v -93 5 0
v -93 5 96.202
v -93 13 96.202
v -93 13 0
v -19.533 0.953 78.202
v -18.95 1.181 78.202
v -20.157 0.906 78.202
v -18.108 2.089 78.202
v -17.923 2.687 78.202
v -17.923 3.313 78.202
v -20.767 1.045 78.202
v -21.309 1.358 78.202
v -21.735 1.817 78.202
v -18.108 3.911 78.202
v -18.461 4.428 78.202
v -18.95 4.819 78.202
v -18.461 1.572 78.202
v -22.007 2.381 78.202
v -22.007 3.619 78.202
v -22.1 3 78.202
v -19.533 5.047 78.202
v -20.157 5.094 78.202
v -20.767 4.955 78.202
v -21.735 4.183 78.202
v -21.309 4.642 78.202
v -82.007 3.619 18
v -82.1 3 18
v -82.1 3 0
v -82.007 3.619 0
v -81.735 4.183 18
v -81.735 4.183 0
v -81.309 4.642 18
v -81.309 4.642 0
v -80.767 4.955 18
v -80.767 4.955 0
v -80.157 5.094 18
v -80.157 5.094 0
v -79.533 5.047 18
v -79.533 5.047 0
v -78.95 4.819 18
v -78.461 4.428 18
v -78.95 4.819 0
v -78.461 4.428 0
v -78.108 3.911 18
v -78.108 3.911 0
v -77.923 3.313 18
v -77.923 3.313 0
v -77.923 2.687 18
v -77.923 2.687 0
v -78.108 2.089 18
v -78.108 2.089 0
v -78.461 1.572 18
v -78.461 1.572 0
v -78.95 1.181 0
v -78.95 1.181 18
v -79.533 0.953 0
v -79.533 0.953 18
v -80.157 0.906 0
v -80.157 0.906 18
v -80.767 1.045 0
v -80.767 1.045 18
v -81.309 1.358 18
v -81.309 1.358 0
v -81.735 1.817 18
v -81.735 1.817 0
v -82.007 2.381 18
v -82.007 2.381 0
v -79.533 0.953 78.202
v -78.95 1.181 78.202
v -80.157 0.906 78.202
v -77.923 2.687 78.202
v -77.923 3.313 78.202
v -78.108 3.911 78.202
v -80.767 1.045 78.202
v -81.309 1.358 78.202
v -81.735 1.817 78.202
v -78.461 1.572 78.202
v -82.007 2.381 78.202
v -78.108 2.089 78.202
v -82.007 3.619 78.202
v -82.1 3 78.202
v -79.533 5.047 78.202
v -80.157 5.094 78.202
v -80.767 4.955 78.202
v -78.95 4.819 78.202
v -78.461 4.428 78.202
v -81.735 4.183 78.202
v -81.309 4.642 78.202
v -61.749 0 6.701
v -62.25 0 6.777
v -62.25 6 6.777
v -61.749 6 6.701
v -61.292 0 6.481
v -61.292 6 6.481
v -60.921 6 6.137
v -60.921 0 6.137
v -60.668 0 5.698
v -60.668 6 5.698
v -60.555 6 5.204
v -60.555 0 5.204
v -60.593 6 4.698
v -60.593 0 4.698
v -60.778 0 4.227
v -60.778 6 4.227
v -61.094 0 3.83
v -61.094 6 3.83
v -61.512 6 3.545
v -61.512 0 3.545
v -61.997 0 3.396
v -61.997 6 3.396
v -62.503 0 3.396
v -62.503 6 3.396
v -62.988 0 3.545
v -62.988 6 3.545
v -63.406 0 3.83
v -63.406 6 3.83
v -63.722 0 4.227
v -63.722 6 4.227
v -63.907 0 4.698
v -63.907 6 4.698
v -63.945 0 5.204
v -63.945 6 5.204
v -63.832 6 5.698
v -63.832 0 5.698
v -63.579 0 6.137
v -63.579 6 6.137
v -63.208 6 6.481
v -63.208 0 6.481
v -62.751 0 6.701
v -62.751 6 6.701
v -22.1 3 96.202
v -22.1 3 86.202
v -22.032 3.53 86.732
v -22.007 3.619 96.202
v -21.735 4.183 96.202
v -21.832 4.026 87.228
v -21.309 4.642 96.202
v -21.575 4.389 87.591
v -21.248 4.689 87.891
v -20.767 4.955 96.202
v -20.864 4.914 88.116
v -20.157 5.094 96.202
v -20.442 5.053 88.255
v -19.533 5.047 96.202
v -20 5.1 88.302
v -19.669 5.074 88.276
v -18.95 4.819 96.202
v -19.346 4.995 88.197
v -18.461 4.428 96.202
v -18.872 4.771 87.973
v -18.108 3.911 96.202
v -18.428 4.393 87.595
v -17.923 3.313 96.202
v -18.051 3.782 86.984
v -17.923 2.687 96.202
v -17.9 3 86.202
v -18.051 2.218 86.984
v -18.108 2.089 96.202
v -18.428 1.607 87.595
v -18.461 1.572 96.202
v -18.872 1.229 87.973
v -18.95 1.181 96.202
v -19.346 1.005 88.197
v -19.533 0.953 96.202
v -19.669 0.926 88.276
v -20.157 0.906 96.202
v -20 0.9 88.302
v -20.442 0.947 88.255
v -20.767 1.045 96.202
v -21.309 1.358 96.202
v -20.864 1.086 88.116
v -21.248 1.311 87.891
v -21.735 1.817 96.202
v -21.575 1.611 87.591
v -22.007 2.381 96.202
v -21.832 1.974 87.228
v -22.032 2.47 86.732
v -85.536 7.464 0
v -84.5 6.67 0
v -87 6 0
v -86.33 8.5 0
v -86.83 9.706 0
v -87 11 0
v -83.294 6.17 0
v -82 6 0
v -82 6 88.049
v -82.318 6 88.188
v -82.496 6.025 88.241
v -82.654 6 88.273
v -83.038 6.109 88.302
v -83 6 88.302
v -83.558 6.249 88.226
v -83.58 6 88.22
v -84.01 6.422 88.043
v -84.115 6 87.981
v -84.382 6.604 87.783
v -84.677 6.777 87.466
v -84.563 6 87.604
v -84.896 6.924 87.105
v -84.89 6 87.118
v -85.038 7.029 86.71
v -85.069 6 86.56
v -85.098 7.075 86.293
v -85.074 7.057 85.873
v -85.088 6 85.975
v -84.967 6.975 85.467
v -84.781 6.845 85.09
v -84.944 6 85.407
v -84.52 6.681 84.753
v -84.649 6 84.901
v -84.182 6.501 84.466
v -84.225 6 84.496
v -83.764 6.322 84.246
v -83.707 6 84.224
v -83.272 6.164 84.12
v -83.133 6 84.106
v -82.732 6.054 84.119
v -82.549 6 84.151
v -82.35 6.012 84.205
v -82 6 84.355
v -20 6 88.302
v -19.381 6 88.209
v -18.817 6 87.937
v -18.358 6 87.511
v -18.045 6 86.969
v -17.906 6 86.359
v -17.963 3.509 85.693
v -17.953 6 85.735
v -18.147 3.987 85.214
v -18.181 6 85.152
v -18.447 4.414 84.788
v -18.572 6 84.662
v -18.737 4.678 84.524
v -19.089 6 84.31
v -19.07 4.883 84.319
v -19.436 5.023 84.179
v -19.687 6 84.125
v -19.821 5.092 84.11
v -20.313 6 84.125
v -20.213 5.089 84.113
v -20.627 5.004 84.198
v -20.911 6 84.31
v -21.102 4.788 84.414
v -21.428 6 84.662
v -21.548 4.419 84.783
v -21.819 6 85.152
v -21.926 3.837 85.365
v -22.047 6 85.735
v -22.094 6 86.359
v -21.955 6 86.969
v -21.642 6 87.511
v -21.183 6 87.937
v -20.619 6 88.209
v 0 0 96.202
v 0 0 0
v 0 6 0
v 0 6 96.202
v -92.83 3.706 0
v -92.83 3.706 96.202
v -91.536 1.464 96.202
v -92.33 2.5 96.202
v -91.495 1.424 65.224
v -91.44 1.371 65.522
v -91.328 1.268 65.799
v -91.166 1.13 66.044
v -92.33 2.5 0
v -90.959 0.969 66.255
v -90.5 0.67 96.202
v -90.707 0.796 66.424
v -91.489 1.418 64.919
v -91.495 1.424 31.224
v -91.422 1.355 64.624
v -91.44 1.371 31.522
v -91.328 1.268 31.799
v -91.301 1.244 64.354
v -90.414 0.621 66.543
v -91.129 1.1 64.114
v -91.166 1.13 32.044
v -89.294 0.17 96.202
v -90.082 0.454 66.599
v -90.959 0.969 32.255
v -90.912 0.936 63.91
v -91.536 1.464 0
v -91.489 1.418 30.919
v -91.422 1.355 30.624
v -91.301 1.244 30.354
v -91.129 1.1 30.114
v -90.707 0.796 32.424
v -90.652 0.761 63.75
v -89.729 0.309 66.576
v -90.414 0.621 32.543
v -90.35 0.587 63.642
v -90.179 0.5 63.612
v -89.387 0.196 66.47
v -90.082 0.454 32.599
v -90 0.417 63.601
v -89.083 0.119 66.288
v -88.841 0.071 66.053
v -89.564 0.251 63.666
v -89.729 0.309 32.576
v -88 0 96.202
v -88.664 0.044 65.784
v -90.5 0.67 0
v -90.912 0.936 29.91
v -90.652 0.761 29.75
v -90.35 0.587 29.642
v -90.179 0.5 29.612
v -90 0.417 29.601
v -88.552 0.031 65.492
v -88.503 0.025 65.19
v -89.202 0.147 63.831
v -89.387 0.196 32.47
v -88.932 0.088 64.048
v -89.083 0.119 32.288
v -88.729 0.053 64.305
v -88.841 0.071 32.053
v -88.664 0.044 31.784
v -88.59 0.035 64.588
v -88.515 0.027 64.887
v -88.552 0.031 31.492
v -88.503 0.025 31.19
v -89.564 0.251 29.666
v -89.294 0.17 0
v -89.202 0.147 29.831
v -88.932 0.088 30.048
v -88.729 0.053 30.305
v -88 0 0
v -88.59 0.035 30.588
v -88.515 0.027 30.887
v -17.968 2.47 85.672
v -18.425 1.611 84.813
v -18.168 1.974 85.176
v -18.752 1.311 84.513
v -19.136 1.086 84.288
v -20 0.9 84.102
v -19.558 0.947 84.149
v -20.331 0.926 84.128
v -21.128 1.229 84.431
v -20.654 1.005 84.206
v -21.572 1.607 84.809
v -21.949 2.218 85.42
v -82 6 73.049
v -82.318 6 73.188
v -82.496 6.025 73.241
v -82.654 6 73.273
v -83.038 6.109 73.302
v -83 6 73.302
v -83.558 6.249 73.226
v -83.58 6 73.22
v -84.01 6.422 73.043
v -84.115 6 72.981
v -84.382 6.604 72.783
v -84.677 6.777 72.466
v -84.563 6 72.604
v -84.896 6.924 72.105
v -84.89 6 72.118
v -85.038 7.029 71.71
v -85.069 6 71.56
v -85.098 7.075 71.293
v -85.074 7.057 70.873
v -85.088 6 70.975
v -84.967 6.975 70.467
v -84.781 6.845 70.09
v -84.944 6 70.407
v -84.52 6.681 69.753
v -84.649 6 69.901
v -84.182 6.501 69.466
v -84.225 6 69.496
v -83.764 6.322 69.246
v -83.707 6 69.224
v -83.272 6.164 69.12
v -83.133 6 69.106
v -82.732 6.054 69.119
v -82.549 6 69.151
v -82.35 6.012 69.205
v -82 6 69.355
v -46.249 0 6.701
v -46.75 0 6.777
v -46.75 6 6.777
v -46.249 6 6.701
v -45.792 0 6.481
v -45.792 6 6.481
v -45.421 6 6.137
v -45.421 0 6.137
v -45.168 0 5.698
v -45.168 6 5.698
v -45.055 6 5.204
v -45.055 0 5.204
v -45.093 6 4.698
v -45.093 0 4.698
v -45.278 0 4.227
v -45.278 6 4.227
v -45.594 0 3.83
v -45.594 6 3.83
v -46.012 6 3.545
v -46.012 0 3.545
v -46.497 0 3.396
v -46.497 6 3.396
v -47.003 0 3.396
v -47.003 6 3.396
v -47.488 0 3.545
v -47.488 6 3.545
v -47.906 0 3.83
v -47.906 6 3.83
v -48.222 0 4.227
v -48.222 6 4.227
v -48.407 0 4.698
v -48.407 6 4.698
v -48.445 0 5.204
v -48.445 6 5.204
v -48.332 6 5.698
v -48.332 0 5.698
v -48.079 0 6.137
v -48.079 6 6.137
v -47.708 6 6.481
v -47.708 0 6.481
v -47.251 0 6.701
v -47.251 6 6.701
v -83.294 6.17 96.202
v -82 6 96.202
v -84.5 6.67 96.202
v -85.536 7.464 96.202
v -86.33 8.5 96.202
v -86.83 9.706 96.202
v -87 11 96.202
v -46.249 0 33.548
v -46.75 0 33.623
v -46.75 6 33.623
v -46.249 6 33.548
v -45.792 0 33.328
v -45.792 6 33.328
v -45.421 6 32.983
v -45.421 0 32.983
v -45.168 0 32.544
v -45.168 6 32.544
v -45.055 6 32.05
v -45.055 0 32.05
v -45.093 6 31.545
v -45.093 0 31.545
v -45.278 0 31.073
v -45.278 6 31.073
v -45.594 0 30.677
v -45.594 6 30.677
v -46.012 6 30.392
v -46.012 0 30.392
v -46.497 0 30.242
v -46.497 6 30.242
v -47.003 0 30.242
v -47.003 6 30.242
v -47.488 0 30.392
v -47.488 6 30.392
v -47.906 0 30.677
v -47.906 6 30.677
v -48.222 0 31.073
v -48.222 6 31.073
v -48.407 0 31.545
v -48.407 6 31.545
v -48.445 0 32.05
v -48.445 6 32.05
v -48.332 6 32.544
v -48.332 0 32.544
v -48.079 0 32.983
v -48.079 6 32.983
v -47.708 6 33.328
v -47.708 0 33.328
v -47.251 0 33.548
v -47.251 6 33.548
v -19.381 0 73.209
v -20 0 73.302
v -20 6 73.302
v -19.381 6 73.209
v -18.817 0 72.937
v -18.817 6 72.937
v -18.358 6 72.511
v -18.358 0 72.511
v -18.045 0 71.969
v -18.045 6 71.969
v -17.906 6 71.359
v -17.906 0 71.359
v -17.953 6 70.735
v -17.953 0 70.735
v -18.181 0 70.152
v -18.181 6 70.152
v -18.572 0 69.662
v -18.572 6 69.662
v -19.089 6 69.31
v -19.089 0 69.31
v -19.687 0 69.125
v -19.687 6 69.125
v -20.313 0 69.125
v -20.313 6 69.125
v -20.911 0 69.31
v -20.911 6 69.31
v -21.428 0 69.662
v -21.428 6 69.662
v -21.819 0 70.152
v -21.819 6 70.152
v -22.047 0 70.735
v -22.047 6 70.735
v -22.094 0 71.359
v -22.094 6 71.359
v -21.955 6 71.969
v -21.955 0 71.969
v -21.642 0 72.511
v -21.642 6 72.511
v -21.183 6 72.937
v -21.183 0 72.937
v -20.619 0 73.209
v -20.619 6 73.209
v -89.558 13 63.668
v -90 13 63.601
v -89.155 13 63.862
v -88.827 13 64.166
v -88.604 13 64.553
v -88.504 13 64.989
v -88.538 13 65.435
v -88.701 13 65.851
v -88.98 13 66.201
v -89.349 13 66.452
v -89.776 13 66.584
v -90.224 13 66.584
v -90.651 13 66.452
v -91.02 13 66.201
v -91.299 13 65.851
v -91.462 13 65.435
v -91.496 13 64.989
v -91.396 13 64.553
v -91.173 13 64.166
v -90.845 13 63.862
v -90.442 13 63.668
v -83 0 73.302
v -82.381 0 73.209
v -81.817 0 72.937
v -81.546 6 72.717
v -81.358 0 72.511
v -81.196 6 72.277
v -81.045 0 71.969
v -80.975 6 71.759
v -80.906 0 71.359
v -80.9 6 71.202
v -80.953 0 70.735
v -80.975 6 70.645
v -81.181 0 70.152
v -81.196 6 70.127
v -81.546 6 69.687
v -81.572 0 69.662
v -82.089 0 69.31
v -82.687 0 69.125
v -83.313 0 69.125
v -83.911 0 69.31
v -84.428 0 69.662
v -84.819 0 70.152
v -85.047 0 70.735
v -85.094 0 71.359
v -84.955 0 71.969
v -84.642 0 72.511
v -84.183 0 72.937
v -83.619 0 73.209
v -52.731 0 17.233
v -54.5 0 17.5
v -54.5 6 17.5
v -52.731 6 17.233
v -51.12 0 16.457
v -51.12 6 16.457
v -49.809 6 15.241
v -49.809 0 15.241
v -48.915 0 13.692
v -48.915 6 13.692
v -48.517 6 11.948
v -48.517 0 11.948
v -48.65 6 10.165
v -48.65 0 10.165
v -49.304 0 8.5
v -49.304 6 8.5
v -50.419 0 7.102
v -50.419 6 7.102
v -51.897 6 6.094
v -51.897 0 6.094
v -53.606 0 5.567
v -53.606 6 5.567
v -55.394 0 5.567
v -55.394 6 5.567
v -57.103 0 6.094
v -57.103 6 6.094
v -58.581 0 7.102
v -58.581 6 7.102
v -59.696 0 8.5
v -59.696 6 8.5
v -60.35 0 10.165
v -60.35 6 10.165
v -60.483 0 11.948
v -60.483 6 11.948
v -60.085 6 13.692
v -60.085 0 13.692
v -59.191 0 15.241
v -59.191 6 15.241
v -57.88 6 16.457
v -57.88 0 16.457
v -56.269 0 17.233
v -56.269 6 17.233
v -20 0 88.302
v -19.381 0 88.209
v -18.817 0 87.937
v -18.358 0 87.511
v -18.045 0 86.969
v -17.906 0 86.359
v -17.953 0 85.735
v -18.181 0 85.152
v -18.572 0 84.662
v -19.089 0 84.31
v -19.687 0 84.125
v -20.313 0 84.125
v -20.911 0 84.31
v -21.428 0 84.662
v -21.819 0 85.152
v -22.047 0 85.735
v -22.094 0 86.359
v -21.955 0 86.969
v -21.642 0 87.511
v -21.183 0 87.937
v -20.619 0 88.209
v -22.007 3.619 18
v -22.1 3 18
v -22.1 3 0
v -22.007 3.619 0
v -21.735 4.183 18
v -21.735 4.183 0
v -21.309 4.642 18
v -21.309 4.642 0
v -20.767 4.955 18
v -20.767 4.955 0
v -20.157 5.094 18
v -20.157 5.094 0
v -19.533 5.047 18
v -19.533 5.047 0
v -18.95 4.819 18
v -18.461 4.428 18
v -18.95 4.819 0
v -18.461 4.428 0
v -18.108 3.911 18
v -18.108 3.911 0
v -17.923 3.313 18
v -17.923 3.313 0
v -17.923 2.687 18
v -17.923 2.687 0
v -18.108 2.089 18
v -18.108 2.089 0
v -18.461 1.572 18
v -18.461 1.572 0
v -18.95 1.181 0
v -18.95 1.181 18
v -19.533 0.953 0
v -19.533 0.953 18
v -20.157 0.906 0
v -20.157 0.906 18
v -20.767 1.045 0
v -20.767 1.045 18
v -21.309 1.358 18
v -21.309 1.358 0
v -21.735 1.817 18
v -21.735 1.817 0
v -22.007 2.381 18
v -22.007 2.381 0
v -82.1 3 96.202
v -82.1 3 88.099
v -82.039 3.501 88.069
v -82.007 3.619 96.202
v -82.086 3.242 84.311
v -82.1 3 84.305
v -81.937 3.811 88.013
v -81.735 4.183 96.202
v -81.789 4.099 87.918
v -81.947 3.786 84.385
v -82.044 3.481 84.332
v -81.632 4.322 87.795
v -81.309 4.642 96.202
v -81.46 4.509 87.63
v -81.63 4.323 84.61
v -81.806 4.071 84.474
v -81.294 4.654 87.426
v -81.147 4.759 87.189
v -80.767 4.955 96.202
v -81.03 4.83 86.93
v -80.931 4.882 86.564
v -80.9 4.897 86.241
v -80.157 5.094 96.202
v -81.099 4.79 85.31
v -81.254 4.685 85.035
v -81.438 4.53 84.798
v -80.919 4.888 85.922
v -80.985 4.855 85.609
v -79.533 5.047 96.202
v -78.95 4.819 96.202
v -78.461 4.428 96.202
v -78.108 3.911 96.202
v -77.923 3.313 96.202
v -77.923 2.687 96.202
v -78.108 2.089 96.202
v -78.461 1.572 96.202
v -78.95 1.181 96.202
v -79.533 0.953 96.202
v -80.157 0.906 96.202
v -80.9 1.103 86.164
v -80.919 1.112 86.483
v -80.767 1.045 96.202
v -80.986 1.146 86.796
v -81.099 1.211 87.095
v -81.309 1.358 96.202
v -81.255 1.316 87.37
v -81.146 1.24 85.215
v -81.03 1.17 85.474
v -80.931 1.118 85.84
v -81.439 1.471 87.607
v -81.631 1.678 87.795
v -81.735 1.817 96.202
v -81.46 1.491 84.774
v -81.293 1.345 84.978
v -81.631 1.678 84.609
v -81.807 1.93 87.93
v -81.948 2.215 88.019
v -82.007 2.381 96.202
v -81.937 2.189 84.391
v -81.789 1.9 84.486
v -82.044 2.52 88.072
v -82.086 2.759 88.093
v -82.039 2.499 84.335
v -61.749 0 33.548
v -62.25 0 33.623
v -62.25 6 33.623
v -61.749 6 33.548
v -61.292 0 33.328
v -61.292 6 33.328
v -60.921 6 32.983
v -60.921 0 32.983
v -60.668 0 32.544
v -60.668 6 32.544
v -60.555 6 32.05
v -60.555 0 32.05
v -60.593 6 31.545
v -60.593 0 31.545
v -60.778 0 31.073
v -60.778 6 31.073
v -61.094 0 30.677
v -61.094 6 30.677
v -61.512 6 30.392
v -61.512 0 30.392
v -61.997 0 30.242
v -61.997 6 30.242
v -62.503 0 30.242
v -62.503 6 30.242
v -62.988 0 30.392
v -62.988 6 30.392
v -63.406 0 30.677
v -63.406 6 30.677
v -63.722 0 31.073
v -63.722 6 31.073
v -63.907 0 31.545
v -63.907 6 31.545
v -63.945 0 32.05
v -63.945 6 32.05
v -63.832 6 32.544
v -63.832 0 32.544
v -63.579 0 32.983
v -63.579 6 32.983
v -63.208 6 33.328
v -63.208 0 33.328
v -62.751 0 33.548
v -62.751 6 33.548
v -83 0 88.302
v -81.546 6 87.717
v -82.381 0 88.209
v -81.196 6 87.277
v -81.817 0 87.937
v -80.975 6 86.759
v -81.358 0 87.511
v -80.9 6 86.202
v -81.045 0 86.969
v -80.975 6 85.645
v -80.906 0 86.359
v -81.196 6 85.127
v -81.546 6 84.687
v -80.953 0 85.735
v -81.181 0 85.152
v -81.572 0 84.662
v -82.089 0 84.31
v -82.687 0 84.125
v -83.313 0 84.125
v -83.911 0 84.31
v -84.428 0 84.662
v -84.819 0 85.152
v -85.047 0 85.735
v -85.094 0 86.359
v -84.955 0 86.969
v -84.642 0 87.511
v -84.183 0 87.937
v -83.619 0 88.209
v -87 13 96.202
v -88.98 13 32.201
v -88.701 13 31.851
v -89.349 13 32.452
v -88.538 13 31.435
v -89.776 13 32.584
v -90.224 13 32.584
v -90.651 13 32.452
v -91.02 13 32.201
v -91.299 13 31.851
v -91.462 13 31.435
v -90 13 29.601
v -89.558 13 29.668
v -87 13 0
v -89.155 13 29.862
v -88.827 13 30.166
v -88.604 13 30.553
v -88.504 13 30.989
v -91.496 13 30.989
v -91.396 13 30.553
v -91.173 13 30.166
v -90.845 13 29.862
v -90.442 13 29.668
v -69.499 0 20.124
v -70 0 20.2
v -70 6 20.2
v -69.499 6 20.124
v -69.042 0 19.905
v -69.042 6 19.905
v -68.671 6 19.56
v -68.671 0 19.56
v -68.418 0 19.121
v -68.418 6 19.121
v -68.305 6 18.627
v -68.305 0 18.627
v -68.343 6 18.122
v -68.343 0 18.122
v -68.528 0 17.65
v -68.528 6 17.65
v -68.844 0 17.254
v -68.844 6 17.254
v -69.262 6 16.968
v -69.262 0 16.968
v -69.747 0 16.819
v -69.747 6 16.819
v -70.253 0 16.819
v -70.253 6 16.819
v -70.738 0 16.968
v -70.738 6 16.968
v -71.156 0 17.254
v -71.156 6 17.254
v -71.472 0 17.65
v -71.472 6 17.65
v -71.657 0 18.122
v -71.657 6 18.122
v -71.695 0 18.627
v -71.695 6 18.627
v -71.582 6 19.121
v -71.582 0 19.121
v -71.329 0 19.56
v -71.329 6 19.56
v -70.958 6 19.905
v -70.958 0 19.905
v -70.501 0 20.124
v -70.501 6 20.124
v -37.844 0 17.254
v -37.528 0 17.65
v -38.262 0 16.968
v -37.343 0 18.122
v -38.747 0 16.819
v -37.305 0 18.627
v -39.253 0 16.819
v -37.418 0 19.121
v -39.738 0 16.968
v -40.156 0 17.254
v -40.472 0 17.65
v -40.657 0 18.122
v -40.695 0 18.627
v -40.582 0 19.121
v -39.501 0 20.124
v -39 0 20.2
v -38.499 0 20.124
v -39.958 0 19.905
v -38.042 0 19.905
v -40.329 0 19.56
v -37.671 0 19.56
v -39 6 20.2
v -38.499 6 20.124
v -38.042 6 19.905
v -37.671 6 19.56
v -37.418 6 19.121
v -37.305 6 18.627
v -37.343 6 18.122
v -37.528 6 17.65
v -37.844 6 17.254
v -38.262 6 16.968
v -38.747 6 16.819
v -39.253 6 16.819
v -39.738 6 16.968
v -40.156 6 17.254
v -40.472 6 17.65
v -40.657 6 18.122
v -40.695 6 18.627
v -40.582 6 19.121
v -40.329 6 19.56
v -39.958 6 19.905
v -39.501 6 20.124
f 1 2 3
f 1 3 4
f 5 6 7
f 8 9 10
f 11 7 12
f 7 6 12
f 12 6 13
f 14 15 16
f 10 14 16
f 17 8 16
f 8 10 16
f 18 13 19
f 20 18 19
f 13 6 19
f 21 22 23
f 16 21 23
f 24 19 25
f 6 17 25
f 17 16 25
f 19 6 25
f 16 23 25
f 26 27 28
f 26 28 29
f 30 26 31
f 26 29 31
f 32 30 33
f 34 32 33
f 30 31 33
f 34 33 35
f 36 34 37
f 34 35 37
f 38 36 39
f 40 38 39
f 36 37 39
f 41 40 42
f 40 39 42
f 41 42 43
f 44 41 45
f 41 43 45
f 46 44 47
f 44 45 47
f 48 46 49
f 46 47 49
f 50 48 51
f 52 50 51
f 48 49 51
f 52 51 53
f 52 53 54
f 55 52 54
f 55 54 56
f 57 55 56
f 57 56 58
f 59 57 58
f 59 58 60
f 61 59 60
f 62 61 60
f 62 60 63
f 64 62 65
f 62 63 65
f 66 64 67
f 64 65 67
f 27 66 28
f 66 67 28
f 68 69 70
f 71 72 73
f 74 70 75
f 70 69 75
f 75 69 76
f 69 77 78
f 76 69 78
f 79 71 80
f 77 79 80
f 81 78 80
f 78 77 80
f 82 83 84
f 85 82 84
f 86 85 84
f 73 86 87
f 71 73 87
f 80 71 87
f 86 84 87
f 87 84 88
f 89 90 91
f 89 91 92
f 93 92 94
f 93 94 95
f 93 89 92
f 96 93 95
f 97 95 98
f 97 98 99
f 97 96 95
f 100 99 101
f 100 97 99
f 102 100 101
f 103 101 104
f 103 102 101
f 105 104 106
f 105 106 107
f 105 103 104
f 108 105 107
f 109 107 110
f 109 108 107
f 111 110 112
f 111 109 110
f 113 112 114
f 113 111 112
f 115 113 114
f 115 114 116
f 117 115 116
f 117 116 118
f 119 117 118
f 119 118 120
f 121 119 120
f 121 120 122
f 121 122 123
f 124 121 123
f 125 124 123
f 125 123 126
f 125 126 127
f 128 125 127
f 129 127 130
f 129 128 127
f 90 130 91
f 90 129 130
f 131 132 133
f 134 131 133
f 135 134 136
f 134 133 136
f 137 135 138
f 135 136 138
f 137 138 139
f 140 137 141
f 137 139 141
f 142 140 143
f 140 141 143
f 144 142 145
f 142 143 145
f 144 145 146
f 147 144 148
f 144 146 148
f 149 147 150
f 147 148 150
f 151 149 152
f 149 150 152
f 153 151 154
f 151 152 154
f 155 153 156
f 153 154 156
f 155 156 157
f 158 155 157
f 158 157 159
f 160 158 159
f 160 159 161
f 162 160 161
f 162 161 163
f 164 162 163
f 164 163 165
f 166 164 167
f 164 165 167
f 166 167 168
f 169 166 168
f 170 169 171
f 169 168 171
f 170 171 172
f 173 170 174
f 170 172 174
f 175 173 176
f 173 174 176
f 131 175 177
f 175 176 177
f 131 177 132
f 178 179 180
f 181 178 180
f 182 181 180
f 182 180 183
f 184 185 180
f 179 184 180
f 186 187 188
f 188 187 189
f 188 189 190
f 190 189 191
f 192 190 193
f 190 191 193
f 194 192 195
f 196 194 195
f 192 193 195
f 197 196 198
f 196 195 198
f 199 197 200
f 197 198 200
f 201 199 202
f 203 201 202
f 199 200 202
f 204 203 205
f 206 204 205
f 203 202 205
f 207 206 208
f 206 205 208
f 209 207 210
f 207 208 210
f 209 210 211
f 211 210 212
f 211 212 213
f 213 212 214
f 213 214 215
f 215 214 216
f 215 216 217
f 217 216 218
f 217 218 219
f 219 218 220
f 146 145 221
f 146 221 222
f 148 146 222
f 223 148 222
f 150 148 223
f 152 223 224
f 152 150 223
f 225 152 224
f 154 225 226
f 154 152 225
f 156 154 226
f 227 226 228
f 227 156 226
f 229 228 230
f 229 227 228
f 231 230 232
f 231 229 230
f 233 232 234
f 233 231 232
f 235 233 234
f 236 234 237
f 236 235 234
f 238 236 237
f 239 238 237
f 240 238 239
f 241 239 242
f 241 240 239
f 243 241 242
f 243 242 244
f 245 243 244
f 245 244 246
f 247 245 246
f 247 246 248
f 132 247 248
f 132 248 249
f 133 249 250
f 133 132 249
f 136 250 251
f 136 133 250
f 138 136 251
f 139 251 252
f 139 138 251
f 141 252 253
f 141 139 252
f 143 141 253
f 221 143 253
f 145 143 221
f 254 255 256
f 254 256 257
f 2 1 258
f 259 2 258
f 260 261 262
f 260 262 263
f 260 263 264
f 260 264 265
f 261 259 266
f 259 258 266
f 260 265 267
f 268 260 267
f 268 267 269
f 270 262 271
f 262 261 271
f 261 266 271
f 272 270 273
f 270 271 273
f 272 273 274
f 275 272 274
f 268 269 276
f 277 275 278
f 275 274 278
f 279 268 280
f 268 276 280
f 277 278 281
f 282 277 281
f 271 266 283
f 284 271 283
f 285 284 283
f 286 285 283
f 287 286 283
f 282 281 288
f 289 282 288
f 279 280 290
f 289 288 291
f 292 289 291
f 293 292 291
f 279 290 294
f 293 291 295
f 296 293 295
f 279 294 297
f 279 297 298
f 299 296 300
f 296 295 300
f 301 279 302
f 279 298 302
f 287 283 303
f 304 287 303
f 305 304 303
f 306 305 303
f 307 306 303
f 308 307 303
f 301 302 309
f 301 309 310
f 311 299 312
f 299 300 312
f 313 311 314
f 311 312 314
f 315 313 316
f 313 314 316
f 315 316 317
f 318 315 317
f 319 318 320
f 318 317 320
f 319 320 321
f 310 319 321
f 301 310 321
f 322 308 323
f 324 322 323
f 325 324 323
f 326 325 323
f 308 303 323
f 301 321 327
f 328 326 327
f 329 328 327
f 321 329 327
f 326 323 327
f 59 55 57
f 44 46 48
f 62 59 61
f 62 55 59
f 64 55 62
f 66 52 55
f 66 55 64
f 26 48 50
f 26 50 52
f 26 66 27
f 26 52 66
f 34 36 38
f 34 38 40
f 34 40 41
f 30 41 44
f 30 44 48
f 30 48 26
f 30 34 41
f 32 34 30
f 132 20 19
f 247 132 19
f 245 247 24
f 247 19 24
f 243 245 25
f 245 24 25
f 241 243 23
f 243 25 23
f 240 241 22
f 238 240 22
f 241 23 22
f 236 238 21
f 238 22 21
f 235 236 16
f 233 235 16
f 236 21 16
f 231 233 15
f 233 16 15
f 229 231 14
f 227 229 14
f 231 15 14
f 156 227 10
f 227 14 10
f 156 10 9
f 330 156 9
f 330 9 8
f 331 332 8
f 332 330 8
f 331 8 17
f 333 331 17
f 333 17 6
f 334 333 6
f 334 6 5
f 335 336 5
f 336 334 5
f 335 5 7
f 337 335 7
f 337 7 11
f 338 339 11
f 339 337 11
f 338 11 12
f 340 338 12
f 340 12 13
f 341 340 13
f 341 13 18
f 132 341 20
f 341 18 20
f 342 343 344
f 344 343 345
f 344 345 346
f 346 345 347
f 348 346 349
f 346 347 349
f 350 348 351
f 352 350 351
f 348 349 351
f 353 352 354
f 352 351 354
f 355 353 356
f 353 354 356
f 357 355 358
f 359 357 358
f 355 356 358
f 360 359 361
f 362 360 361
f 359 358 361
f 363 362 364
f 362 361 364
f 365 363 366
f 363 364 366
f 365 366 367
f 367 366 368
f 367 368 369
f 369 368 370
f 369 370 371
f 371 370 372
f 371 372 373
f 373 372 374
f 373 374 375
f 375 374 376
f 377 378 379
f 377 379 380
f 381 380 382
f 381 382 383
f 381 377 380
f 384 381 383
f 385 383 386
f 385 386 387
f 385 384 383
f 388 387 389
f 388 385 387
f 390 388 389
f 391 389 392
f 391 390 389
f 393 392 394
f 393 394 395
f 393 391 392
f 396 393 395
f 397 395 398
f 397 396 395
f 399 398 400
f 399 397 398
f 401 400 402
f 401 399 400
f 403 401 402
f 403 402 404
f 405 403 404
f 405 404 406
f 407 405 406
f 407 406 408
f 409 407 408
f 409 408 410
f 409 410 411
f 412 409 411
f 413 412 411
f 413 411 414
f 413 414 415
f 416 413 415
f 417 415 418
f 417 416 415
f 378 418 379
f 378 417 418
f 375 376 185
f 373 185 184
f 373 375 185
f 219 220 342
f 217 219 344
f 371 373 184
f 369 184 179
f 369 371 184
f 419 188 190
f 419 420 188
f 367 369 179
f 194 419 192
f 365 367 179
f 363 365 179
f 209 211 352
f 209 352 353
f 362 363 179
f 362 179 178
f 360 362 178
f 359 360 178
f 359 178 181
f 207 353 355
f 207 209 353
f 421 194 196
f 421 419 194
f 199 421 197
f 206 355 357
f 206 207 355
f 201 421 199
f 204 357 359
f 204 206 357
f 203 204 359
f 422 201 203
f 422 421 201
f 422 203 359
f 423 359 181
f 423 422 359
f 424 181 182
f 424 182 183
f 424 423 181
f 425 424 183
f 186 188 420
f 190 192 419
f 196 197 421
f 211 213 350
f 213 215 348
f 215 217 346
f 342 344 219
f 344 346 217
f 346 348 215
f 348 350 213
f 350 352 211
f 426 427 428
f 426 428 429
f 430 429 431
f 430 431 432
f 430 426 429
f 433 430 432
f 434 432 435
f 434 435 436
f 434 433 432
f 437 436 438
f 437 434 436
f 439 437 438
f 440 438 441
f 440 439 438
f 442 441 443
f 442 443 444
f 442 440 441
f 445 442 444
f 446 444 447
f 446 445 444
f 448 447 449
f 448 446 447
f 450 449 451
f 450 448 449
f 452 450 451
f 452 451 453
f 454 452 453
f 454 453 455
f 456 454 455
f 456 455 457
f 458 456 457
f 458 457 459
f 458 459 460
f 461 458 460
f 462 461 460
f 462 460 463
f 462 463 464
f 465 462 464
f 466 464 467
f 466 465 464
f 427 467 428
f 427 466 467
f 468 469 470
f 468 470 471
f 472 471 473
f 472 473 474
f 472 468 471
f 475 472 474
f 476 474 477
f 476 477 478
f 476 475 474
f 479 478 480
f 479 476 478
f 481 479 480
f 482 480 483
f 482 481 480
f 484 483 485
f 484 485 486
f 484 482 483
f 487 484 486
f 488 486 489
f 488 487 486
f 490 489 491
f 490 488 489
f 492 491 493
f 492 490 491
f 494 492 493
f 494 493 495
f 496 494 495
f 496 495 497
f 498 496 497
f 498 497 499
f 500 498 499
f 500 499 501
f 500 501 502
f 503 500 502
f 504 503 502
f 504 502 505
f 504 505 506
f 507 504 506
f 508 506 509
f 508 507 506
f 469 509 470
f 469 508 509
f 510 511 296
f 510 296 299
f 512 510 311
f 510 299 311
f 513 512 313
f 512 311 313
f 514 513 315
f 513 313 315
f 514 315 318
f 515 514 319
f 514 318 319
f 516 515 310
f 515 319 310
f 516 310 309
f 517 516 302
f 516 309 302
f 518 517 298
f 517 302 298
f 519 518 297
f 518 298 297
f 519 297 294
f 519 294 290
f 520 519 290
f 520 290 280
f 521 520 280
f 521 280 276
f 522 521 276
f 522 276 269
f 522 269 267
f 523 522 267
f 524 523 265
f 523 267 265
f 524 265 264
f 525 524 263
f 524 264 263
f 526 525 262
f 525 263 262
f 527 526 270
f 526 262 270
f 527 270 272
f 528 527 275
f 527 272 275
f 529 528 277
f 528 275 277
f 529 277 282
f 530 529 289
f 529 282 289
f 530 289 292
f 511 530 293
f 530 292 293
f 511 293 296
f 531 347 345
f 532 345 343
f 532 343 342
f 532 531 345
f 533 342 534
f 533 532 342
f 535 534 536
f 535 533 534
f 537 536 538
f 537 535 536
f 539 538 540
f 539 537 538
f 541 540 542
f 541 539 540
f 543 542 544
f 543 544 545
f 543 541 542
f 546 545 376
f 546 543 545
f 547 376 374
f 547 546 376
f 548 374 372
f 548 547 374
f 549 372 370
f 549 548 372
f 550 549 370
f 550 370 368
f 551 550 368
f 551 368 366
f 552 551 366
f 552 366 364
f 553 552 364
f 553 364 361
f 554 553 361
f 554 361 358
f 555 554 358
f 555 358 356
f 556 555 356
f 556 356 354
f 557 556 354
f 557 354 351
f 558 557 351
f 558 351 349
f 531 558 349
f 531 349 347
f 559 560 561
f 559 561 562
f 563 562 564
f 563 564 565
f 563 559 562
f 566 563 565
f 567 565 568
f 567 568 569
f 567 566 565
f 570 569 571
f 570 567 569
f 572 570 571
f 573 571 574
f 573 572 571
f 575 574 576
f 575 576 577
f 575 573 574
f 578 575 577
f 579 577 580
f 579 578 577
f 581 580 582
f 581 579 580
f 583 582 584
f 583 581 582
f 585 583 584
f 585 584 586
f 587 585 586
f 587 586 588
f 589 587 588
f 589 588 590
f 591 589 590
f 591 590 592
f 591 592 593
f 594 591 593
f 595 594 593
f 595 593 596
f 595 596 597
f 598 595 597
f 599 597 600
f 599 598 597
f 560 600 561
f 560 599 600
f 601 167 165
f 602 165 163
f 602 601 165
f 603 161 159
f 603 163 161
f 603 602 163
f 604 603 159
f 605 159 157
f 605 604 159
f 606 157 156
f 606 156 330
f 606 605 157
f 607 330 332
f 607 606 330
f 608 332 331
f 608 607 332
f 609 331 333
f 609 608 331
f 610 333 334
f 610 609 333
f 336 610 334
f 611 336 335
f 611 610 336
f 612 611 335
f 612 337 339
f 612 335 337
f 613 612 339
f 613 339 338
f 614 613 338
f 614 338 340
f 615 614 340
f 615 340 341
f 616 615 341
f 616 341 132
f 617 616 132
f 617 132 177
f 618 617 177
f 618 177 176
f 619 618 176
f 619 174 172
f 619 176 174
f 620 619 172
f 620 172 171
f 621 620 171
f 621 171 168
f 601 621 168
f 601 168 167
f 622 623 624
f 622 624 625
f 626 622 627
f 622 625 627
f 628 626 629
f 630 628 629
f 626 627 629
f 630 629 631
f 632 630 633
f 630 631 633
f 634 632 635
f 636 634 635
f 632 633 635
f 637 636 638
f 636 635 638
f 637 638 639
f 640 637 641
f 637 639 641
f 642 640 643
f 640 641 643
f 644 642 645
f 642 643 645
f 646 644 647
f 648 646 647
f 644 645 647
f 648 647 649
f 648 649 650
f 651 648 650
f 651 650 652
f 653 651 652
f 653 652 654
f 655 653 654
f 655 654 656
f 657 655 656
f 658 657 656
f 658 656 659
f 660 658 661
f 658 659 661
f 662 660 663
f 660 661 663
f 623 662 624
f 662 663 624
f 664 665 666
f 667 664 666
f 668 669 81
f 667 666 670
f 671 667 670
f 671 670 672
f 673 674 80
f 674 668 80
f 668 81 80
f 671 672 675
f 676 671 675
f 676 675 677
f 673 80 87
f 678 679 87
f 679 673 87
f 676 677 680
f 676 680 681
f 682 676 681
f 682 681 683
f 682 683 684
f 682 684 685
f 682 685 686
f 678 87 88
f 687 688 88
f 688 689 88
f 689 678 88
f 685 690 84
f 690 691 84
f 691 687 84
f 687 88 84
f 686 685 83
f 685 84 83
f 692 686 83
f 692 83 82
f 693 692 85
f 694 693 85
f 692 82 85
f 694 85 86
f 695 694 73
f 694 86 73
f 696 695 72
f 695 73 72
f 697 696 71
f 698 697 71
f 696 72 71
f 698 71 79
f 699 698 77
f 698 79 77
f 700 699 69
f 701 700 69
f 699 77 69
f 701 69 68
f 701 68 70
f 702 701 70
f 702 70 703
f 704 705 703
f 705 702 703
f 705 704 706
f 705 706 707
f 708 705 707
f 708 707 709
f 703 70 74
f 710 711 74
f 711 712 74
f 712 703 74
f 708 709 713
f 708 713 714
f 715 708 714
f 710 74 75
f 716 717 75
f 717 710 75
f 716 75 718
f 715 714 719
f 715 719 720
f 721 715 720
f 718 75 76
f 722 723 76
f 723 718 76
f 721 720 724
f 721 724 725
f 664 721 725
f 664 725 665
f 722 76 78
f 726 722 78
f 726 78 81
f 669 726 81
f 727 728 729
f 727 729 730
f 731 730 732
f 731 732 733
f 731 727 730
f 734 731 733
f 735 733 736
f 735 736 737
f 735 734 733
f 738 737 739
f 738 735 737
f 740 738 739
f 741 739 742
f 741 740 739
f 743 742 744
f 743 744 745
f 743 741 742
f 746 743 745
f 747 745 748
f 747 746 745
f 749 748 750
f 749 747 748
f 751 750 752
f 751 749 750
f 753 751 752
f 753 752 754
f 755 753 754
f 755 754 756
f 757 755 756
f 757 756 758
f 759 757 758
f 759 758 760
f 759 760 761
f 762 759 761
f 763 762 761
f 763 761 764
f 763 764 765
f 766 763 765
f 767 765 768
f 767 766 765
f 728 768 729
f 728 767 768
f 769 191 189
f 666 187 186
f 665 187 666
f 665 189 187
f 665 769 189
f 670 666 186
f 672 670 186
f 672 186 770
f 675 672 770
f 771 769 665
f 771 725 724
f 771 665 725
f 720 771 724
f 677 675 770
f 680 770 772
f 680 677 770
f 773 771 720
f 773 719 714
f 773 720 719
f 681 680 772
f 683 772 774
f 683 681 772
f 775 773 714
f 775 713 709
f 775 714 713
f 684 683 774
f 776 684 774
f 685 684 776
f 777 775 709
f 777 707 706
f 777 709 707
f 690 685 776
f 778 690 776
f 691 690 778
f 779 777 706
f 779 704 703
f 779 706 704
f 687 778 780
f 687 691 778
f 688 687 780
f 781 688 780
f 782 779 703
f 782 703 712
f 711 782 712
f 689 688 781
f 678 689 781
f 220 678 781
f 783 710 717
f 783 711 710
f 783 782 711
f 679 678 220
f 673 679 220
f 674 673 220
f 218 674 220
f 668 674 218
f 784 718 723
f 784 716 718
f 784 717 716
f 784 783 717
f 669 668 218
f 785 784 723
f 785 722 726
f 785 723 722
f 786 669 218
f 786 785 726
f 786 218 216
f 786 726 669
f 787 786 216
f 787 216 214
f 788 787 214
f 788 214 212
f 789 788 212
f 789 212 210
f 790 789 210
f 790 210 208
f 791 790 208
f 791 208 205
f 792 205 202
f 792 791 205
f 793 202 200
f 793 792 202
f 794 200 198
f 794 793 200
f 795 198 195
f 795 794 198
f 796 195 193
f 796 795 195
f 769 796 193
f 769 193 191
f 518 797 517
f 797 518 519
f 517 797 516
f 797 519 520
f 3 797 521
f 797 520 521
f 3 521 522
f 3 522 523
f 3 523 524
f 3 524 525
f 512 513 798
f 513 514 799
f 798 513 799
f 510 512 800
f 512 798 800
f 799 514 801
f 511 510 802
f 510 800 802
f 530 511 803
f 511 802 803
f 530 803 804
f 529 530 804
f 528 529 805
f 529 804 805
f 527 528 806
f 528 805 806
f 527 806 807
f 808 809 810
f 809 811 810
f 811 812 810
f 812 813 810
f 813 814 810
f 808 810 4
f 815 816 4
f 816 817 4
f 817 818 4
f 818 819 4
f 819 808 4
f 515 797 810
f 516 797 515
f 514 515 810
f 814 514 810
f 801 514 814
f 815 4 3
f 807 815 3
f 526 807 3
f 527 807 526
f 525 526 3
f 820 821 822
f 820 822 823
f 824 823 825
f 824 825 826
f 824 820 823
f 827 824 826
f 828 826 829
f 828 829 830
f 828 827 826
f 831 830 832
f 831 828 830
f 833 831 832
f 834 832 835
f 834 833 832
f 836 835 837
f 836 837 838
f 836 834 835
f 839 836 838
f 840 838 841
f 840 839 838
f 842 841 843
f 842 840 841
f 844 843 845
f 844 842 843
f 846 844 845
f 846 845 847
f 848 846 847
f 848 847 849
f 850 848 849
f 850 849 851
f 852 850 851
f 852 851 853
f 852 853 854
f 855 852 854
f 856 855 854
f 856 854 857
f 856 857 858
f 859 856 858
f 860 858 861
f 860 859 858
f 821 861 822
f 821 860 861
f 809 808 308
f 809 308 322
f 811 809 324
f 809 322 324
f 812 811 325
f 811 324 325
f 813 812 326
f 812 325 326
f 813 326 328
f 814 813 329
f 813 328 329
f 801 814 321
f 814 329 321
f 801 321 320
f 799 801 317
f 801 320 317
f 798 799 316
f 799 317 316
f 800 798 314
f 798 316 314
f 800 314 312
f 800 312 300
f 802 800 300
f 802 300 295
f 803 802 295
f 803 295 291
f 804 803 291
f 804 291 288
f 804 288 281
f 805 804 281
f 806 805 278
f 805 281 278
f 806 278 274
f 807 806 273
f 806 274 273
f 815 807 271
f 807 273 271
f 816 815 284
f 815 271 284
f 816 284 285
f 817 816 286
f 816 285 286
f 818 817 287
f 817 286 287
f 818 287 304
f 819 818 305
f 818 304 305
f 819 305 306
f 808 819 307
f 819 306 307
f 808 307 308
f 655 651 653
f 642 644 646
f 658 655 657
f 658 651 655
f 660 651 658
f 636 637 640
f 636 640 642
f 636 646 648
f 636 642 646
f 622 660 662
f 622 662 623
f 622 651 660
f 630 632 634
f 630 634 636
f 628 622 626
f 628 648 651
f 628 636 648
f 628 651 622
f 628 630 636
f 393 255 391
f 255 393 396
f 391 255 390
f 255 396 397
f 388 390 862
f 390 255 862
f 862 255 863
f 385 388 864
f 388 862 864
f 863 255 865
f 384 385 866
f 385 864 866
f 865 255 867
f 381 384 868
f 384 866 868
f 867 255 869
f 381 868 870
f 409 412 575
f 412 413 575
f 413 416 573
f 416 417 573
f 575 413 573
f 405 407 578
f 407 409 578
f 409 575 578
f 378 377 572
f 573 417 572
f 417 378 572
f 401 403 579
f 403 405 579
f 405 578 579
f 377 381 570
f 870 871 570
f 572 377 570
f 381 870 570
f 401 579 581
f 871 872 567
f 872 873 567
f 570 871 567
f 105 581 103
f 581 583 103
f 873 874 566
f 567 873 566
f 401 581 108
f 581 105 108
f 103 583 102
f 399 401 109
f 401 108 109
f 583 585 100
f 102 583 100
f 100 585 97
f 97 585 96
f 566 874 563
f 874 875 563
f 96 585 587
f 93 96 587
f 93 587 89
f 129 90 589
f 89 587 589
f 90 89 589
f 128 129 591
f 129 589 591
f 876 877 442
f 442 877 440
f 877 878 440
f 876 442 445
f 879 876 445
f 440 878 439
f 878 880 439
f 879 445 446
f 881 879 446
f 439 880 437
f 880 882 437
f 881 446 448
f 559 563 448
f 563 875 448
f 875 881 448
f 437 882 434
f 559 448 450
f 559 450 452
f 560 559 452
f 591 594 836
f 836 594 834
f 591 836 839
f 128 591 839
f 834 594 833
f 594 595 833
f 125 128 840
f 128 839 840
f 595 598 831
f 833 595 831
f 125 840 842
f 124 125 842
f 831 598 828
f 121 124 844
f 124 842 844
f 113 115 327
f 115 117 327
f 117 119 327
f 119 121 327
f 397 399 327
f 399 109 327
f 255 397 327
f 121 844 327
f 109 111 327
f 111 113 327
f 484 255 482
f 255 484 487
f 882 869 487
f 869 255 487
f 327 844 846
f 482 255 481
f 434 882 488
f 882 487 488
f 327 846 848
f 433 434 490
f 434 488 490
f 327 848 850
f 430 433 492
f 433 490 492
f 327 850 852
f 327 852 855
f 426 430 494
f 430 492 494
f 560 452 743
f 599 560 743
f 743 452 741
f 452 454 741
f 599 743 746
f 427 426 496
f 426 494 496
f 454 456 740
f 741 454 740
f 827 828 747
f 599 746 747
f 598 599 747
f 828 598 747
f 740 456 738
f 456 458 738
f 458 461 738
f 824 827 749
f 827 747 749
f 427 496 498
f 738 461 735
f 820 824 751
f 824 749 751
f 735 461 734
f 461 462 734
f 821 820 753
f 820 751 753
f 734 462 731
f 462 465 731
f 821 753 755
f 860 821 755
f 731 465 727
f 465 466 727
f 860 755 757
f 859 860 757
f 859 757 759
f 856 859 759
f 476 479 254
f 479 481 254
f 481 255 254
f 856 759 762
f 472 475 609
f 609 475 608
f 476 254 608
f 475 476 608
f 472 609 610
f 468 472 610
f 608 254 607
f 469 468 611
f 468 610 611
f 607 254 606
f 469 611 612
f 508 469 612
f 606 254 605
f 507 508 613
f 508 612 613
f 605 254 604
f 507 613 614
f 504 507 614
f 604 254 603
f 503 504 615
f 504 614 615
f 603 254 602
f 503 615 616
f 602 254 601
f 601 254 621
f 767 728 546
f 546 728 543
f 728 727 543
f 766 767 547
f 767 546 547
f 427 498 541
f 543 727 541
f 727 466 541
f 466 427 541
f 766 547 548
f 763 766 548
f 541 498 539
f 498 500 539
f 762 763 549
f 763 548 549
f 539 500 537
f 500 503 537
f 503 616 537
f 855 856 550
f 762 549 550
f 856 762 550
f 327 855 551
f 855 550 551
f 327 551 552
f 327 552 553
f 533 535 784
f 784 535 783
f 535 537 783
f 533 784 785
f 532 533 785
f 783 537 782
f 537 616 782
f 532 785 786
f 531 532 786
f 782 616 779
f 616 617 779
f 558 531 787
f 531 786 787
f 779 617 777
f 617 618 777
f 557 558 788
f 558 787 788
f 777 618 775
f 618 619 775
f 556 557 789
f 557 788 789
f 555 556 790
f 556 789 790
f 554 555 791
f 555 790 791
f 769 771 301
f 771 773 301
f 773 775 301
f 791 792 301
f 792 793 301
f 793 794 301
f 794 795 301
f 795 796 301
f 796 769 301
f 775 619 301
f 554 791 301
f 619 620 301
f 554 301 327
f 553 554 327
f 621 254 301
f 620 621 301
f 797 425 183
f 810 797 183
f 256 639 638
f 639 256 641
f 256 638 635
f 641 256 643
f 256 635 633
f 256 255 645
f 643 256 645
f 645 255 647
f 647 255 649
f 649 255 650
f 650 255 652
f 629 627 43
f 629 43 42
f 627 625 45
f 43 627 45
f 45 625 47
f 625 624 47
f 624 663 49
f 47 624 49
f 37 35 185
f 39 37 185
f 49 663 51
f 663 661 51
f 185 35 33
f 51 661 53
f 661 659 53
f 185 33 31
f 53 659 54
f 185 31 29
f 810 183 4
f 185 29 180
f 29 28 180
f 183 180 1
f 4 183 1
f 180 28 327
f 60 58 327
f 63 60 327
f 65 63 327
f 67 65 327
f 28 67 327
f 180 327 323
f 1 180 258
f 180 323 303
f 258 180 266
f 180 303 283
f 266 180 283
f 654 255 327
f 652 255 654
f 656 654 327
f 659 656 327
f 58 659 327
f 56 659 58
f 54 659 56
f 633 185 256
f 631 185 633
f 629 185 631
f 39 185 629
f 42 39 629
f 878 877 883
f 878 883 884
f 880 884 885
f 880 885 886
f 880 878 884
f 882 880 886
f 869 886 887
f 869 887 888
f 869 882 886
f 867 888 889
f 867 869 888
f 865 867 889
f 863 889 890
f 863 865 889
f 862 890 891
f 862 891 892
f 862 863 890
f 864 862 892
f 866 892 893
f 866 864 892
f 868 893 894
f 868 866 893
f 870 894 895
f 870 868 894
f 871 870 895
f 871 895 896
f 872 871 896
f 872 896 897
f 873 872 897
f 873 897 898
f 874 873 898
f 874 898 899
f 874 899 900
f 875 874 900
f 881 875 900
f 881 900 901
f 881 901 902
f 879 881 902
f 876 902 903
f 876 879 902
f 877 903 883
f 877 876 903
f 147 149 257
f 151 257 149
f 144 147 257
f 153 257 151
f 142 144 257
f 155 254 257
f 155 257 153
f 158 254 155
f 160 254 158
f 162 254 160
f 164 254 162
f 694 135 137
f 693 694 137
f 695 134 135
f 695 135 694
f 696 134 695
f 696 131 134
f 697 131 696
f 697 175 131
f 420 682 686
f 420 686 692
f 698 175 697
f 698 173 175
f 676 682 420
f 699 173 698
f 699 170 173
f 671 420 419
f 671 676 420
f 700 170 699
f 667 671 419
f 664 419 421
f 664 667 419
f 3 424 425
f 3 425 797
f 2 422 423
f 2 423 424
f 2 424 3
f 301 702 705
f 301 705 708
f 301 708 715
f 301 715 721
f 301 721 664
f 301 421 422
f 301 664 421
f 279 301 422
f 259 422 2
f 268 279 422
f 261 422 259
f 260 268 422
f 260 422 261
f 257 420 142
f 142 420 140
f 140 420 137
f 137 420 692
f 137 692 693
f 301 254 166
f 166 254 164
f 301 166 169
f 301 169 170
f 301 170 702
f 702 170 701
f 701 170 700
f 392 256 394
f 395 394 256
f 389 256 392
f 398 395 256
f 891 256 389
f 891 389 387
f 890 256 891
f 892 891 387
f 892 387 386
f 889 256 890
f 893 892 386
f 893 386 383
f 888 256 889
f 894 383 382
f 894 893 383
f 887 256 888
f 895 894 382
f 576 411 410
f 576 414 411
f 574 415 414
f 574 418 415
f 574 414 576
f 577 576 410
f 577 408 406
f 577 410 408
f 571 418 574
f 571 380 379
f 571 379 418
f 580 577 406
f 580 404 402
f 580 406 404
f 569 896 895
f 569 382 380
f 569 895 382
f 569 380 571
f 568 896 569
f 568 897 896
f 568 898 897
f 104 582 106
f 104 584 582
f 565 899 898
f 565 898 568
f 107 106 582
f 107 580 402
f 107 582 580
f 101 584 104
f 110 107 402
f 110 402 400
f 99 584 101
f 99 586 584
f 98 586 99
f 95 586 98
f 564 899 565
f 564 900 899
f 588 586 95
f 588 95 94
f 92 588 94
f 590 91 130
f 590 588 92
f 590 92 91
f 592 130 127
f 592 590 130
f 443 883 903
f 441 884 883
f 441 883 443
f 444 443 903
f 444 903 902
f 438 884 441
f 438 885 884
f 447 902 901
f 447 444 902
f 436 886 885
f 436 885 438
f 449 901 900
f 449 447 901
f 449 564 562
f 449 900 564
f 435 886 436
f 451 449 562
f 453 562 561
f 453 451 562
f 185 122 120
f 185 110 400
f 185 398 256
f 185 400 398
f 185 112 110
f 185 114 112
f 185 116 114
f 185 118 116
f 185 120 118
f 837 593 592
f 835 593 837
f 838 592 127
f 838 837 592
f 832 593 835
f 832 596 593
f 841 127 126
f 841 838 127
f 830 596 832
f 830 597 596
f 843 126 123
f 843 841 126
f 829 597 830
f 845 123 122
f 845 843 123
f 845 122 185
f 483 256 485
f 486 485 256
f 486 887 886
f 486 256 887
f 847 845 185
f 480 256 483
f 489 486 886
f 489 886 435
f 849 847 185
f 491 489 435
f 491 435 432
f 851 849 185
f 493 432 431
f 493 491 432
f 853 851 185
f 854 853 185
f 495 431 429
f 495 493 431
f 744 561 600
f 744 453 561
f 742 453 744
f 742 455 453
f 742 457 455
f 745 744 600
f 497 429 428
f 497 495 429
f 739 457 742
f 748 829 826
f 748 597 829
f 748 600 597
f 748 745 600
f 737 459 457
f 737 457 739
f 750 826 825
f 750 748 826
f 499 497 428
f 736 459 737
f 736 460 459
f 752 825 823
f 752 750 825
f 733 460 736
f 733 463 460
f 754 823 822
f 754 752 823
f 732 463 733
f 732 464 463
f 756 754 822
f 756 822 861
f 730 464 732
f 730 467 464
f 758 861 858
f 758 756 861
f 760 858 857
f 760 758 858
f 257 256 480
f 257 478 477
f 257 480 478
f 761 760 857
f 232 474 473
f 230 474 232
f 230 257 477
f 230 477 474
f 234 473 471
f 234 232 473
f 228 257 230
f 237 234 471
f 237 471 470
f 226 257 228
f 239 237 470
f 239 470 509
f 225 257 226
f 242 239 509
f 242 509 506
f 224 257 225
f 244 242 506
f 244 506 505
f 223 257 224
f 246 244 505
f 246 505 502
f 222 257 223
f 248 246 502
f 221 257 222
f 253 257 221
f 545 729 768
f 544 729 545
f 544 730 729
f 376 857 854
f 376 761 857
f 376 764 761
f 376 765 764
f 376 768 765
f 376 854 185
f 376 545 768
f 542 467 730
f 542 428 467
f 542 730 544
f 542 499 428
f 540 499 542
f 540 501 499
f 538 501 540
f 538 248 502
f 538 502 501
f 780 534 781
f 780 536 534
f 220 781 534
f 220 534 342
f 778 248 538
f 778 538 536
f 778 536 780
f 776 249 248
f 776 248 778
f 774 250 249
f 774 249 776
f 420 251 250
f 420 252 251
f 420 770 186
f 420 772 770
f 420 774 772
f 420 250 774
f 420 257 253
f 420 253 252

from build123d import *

# Parameters (mm, degrees)
SKETCH1_W           = 93
SKETCH1_H           = 96.2019
SKETCH1_R           = 6
SKETCH1_R_2         = 1.7
SKETCH1_R_3         = 2.1
BOSS_EXTRUDE1_DEPTH = 6
BOSS_EXTRUDE2_START = -6
SKETCH2_W           = 6
SKETCH2_H           = 96.2019
SKETCH2_R           = 1.5
BOSS_EXTRUDE2_DEPTH = 7
SKETCH2_3_R         = 1.5
CUT_EXTRUDE2_DEPTH  = 135.435135153
SKETCH3_R           = 2.1
CUT_EXTRUDE3_DEPTH  = 18
CUT_EXTRUDE4_START  = -78.2019
SKETCH3_2_R         = 2.1
CUT_EXTRUDE4_DEPTH  = 18
FILLET1_R           = 5


with BuildPart() as part:
    # Sketch1 → Boss-Extrude1 (new body)
    with BuildSketch(Plane(origin=(0, 0, 0), x_dir=(-1, 0, 0), z_dir=(0, 1, 0))):
        with Locations((46.5, 48.10095)):
            Rectangle(SKETCH1_W, SKETCH1_H)
        with Locations(Location((54.5, 11.5, 0), (0, 0, 90))):
            Circle(SKETCH1_R, mode=Mode.SUBTRACT)
        with Locations(Location((39, 18.5, 0), (0, 0, 90))):
            Circle(SKETCH1_R_2, mode=Mode.SUBTRACT)
        with Locations(Location((46.75, 31.923393759, 0), (0, 0, 90))):
            Circle(SKETCH1_R_2, mode=Mode.SUBTRACT)
        with Locations(Location((62.25, 31.923393759, 0), (0, 0, 90))):
            Circle(SKETCH1_R_2, mode=Mode.SUBTRACT)
        with Locations(Location((70, 18.5, 0), (0, 0, 90))):
            Circle(SKETCH1_R_2, mode=Mode.SUBTRACT)
        with Locations(Location((62.25, 5.076606241, 0), (0, 0, 90))):
            Circle(SKETCH1_R_2, mode=Mode.SUBTRACT)
        with Locations(Location((46.75, 5.076606241, 0), (0, 0, 90))):
            Circle(SKETCH1_R_2, mode=Mode.SUBTRACT)
        with Locations(Location((20, 86.2019, 0), (0, 0, 90))):
            Circle(SKETCH1_R_3, mode=Mode.SUBTRACT)
        with Locations(Location((83, 86.2019, 0), (0, 0, 90))):
            Circle(SKETCH1_R_3, mode=Mode.SUBTRACT)
        with Locations(Location((83, 71.2019, 0), (0, 0, 90))):
            Circle(SKETCH1_R_3, mode=Mode.SUBTRACT)
        with Locations(Location((20, 71.2019, 0), (0, 0, 90))):
            Circle(SKETCH1_R_3, mode=Mode.SUBTRACT)
    extrude(amount=BOSS_EXTRUDE1_DEPTH)

    # Sketch2 → Boss-Extrude2 (add)
    with BuildSketch(Plane(origin=(0, 0, 0), x_dir=(-1, 0, 0), z_dir=(0, -1, 0)).offset(BOSS_EXTRUDE2_START)):
        with Locations((90, -48.10095)):
            Rectangle(SKETCH2_W, SKETCH2_H)
        with Locations(Location((90, -65.10095, 0), (0, 0, 90))):
            Circle(SKETCH2_R, mode=Mode.SUBTRACT)
        with Locations(Location((90, -31.10095, 0), (0, 0, 90))):
            Circle(SKETCH2_R, mode=Mode.SUBTRACT)
    extrude(amount=-BOSS_EXTRUDE2_DEPTH)

    # Sketch2<3> → Cut-Extrude2 (cut, through all)
    with BuildSketch(Plane(origin=(0, 0, 0), x_dir=(-1, 0, 0), z_dir=(0, -1, 0))):
        with Locations(Location((90, -31.10095, 0), (0, 0, 90))):
            Circle(SKETCH2_3_R)
        with Locations(Location((90, -65.10095, 0), (0, 0, 90))):
            Circle(SKETCH2_3_R)
    extrude(amount=-CUT_EXTRUDE2_DEPTH, mode=Mode.SUBTRACT)

    # Sketch3 → Cut-Extrude3 (cut)
    with BuildSketch(Plane(origin=(0, 0, 0), x_dir=(1, 0, 0), z_dir=(0, 0, -1))):
        with Locations(Location((-80, -3, 0), (0, 0, 180))):
            Circle(SKETCH3_R)
        with Locations(Location((-20, -3, 0), (0, 0, 180))):
            Circle(SKETCH3_R)
    extrude(amount=-CUT_EXTRUDE3_DEPTH, mode=Mode.SUBTRACT)

    # Sketch3<2> → Cut-Extrude4 (cut)
    with BuildSketch(Plane(origin=(0, 0, 0), x_dir=(1, 0, 0), z_dir=(0, 0, -1)).offset(CUT_EXTRUDE4_START)):
        with Locations(Location((-80, -3, 0), (0, 0, 180))):
            Circle(SKETCH3_2_R)
        with Locations(Location((-20, -3, 0), (0, 0, 180))):
            Circle(SKETCH3_2_R)
    extrude(amount=-CUT_EXTRUDE4_DEPTH, mode=Mode.SUBTRACT)

    # Fillet1
    # the kernel refuses this fillet: 5 mm, written as the material it adds along each edge
    with BuildSketch(Plane(origin=(-87, 6, 96.2019), x_dir=(1, 0, 0), z_dir=(0, 0, -1))) as fillet1_piece_1_section:
        with BuildLine():
            CenterArc((FILLET1_R, -FILLET1_R), FILLET1_R, 90, 90)
            Line((0, -FILLET1_R), (0, 0))
            Line((0, 0), (FILLET1_R, 0))
        make_face()
    fillet1_piece_1 = extrude(amount=96.2019, mode=Mode.PRIVATE)
    fillet1_piece_1 = fillet1_piece_1 - Plane(origin=(-83, 7.144811059, 71.2019), x_dir=(0, 0, 1), z_dir=(0, -1, 0)) * Cylinder(2.1, 213, mode=Mode.PRIVATE)
    fillet1_piece_1 = fillet1_piece_1 - Plane(origin=(-83, 7.144811059, 86.2019), x_dir=(0, 0, 1), z_dir=(0, -1, 0)) * Cylinder(2.1, 213, mode=Mode.PRIVATE)
    add(fillet1_piece_1)
    # the kernel refuses this fillet: 5 mm, written as the material it takes off along each edge
    with BuildSketch(Plane(origin=(-93, 0, -12.5), x_dir=(1, 0, 0), z_dir=(0, 0, 1))) as fillet1_2_piece_1:
        with BuildLine():
            CenterArc((FILLET1_R, FILLET1_R), FILLET1_R, 180, 90)
            Line((0, FILLET1_R), (0, 0))
            Line((0, 0), (FILLET1_R, 0))
        make_face()
    extrude(amount=121.2019, mode=Mode.SUBTRACT)


solid = part.part
